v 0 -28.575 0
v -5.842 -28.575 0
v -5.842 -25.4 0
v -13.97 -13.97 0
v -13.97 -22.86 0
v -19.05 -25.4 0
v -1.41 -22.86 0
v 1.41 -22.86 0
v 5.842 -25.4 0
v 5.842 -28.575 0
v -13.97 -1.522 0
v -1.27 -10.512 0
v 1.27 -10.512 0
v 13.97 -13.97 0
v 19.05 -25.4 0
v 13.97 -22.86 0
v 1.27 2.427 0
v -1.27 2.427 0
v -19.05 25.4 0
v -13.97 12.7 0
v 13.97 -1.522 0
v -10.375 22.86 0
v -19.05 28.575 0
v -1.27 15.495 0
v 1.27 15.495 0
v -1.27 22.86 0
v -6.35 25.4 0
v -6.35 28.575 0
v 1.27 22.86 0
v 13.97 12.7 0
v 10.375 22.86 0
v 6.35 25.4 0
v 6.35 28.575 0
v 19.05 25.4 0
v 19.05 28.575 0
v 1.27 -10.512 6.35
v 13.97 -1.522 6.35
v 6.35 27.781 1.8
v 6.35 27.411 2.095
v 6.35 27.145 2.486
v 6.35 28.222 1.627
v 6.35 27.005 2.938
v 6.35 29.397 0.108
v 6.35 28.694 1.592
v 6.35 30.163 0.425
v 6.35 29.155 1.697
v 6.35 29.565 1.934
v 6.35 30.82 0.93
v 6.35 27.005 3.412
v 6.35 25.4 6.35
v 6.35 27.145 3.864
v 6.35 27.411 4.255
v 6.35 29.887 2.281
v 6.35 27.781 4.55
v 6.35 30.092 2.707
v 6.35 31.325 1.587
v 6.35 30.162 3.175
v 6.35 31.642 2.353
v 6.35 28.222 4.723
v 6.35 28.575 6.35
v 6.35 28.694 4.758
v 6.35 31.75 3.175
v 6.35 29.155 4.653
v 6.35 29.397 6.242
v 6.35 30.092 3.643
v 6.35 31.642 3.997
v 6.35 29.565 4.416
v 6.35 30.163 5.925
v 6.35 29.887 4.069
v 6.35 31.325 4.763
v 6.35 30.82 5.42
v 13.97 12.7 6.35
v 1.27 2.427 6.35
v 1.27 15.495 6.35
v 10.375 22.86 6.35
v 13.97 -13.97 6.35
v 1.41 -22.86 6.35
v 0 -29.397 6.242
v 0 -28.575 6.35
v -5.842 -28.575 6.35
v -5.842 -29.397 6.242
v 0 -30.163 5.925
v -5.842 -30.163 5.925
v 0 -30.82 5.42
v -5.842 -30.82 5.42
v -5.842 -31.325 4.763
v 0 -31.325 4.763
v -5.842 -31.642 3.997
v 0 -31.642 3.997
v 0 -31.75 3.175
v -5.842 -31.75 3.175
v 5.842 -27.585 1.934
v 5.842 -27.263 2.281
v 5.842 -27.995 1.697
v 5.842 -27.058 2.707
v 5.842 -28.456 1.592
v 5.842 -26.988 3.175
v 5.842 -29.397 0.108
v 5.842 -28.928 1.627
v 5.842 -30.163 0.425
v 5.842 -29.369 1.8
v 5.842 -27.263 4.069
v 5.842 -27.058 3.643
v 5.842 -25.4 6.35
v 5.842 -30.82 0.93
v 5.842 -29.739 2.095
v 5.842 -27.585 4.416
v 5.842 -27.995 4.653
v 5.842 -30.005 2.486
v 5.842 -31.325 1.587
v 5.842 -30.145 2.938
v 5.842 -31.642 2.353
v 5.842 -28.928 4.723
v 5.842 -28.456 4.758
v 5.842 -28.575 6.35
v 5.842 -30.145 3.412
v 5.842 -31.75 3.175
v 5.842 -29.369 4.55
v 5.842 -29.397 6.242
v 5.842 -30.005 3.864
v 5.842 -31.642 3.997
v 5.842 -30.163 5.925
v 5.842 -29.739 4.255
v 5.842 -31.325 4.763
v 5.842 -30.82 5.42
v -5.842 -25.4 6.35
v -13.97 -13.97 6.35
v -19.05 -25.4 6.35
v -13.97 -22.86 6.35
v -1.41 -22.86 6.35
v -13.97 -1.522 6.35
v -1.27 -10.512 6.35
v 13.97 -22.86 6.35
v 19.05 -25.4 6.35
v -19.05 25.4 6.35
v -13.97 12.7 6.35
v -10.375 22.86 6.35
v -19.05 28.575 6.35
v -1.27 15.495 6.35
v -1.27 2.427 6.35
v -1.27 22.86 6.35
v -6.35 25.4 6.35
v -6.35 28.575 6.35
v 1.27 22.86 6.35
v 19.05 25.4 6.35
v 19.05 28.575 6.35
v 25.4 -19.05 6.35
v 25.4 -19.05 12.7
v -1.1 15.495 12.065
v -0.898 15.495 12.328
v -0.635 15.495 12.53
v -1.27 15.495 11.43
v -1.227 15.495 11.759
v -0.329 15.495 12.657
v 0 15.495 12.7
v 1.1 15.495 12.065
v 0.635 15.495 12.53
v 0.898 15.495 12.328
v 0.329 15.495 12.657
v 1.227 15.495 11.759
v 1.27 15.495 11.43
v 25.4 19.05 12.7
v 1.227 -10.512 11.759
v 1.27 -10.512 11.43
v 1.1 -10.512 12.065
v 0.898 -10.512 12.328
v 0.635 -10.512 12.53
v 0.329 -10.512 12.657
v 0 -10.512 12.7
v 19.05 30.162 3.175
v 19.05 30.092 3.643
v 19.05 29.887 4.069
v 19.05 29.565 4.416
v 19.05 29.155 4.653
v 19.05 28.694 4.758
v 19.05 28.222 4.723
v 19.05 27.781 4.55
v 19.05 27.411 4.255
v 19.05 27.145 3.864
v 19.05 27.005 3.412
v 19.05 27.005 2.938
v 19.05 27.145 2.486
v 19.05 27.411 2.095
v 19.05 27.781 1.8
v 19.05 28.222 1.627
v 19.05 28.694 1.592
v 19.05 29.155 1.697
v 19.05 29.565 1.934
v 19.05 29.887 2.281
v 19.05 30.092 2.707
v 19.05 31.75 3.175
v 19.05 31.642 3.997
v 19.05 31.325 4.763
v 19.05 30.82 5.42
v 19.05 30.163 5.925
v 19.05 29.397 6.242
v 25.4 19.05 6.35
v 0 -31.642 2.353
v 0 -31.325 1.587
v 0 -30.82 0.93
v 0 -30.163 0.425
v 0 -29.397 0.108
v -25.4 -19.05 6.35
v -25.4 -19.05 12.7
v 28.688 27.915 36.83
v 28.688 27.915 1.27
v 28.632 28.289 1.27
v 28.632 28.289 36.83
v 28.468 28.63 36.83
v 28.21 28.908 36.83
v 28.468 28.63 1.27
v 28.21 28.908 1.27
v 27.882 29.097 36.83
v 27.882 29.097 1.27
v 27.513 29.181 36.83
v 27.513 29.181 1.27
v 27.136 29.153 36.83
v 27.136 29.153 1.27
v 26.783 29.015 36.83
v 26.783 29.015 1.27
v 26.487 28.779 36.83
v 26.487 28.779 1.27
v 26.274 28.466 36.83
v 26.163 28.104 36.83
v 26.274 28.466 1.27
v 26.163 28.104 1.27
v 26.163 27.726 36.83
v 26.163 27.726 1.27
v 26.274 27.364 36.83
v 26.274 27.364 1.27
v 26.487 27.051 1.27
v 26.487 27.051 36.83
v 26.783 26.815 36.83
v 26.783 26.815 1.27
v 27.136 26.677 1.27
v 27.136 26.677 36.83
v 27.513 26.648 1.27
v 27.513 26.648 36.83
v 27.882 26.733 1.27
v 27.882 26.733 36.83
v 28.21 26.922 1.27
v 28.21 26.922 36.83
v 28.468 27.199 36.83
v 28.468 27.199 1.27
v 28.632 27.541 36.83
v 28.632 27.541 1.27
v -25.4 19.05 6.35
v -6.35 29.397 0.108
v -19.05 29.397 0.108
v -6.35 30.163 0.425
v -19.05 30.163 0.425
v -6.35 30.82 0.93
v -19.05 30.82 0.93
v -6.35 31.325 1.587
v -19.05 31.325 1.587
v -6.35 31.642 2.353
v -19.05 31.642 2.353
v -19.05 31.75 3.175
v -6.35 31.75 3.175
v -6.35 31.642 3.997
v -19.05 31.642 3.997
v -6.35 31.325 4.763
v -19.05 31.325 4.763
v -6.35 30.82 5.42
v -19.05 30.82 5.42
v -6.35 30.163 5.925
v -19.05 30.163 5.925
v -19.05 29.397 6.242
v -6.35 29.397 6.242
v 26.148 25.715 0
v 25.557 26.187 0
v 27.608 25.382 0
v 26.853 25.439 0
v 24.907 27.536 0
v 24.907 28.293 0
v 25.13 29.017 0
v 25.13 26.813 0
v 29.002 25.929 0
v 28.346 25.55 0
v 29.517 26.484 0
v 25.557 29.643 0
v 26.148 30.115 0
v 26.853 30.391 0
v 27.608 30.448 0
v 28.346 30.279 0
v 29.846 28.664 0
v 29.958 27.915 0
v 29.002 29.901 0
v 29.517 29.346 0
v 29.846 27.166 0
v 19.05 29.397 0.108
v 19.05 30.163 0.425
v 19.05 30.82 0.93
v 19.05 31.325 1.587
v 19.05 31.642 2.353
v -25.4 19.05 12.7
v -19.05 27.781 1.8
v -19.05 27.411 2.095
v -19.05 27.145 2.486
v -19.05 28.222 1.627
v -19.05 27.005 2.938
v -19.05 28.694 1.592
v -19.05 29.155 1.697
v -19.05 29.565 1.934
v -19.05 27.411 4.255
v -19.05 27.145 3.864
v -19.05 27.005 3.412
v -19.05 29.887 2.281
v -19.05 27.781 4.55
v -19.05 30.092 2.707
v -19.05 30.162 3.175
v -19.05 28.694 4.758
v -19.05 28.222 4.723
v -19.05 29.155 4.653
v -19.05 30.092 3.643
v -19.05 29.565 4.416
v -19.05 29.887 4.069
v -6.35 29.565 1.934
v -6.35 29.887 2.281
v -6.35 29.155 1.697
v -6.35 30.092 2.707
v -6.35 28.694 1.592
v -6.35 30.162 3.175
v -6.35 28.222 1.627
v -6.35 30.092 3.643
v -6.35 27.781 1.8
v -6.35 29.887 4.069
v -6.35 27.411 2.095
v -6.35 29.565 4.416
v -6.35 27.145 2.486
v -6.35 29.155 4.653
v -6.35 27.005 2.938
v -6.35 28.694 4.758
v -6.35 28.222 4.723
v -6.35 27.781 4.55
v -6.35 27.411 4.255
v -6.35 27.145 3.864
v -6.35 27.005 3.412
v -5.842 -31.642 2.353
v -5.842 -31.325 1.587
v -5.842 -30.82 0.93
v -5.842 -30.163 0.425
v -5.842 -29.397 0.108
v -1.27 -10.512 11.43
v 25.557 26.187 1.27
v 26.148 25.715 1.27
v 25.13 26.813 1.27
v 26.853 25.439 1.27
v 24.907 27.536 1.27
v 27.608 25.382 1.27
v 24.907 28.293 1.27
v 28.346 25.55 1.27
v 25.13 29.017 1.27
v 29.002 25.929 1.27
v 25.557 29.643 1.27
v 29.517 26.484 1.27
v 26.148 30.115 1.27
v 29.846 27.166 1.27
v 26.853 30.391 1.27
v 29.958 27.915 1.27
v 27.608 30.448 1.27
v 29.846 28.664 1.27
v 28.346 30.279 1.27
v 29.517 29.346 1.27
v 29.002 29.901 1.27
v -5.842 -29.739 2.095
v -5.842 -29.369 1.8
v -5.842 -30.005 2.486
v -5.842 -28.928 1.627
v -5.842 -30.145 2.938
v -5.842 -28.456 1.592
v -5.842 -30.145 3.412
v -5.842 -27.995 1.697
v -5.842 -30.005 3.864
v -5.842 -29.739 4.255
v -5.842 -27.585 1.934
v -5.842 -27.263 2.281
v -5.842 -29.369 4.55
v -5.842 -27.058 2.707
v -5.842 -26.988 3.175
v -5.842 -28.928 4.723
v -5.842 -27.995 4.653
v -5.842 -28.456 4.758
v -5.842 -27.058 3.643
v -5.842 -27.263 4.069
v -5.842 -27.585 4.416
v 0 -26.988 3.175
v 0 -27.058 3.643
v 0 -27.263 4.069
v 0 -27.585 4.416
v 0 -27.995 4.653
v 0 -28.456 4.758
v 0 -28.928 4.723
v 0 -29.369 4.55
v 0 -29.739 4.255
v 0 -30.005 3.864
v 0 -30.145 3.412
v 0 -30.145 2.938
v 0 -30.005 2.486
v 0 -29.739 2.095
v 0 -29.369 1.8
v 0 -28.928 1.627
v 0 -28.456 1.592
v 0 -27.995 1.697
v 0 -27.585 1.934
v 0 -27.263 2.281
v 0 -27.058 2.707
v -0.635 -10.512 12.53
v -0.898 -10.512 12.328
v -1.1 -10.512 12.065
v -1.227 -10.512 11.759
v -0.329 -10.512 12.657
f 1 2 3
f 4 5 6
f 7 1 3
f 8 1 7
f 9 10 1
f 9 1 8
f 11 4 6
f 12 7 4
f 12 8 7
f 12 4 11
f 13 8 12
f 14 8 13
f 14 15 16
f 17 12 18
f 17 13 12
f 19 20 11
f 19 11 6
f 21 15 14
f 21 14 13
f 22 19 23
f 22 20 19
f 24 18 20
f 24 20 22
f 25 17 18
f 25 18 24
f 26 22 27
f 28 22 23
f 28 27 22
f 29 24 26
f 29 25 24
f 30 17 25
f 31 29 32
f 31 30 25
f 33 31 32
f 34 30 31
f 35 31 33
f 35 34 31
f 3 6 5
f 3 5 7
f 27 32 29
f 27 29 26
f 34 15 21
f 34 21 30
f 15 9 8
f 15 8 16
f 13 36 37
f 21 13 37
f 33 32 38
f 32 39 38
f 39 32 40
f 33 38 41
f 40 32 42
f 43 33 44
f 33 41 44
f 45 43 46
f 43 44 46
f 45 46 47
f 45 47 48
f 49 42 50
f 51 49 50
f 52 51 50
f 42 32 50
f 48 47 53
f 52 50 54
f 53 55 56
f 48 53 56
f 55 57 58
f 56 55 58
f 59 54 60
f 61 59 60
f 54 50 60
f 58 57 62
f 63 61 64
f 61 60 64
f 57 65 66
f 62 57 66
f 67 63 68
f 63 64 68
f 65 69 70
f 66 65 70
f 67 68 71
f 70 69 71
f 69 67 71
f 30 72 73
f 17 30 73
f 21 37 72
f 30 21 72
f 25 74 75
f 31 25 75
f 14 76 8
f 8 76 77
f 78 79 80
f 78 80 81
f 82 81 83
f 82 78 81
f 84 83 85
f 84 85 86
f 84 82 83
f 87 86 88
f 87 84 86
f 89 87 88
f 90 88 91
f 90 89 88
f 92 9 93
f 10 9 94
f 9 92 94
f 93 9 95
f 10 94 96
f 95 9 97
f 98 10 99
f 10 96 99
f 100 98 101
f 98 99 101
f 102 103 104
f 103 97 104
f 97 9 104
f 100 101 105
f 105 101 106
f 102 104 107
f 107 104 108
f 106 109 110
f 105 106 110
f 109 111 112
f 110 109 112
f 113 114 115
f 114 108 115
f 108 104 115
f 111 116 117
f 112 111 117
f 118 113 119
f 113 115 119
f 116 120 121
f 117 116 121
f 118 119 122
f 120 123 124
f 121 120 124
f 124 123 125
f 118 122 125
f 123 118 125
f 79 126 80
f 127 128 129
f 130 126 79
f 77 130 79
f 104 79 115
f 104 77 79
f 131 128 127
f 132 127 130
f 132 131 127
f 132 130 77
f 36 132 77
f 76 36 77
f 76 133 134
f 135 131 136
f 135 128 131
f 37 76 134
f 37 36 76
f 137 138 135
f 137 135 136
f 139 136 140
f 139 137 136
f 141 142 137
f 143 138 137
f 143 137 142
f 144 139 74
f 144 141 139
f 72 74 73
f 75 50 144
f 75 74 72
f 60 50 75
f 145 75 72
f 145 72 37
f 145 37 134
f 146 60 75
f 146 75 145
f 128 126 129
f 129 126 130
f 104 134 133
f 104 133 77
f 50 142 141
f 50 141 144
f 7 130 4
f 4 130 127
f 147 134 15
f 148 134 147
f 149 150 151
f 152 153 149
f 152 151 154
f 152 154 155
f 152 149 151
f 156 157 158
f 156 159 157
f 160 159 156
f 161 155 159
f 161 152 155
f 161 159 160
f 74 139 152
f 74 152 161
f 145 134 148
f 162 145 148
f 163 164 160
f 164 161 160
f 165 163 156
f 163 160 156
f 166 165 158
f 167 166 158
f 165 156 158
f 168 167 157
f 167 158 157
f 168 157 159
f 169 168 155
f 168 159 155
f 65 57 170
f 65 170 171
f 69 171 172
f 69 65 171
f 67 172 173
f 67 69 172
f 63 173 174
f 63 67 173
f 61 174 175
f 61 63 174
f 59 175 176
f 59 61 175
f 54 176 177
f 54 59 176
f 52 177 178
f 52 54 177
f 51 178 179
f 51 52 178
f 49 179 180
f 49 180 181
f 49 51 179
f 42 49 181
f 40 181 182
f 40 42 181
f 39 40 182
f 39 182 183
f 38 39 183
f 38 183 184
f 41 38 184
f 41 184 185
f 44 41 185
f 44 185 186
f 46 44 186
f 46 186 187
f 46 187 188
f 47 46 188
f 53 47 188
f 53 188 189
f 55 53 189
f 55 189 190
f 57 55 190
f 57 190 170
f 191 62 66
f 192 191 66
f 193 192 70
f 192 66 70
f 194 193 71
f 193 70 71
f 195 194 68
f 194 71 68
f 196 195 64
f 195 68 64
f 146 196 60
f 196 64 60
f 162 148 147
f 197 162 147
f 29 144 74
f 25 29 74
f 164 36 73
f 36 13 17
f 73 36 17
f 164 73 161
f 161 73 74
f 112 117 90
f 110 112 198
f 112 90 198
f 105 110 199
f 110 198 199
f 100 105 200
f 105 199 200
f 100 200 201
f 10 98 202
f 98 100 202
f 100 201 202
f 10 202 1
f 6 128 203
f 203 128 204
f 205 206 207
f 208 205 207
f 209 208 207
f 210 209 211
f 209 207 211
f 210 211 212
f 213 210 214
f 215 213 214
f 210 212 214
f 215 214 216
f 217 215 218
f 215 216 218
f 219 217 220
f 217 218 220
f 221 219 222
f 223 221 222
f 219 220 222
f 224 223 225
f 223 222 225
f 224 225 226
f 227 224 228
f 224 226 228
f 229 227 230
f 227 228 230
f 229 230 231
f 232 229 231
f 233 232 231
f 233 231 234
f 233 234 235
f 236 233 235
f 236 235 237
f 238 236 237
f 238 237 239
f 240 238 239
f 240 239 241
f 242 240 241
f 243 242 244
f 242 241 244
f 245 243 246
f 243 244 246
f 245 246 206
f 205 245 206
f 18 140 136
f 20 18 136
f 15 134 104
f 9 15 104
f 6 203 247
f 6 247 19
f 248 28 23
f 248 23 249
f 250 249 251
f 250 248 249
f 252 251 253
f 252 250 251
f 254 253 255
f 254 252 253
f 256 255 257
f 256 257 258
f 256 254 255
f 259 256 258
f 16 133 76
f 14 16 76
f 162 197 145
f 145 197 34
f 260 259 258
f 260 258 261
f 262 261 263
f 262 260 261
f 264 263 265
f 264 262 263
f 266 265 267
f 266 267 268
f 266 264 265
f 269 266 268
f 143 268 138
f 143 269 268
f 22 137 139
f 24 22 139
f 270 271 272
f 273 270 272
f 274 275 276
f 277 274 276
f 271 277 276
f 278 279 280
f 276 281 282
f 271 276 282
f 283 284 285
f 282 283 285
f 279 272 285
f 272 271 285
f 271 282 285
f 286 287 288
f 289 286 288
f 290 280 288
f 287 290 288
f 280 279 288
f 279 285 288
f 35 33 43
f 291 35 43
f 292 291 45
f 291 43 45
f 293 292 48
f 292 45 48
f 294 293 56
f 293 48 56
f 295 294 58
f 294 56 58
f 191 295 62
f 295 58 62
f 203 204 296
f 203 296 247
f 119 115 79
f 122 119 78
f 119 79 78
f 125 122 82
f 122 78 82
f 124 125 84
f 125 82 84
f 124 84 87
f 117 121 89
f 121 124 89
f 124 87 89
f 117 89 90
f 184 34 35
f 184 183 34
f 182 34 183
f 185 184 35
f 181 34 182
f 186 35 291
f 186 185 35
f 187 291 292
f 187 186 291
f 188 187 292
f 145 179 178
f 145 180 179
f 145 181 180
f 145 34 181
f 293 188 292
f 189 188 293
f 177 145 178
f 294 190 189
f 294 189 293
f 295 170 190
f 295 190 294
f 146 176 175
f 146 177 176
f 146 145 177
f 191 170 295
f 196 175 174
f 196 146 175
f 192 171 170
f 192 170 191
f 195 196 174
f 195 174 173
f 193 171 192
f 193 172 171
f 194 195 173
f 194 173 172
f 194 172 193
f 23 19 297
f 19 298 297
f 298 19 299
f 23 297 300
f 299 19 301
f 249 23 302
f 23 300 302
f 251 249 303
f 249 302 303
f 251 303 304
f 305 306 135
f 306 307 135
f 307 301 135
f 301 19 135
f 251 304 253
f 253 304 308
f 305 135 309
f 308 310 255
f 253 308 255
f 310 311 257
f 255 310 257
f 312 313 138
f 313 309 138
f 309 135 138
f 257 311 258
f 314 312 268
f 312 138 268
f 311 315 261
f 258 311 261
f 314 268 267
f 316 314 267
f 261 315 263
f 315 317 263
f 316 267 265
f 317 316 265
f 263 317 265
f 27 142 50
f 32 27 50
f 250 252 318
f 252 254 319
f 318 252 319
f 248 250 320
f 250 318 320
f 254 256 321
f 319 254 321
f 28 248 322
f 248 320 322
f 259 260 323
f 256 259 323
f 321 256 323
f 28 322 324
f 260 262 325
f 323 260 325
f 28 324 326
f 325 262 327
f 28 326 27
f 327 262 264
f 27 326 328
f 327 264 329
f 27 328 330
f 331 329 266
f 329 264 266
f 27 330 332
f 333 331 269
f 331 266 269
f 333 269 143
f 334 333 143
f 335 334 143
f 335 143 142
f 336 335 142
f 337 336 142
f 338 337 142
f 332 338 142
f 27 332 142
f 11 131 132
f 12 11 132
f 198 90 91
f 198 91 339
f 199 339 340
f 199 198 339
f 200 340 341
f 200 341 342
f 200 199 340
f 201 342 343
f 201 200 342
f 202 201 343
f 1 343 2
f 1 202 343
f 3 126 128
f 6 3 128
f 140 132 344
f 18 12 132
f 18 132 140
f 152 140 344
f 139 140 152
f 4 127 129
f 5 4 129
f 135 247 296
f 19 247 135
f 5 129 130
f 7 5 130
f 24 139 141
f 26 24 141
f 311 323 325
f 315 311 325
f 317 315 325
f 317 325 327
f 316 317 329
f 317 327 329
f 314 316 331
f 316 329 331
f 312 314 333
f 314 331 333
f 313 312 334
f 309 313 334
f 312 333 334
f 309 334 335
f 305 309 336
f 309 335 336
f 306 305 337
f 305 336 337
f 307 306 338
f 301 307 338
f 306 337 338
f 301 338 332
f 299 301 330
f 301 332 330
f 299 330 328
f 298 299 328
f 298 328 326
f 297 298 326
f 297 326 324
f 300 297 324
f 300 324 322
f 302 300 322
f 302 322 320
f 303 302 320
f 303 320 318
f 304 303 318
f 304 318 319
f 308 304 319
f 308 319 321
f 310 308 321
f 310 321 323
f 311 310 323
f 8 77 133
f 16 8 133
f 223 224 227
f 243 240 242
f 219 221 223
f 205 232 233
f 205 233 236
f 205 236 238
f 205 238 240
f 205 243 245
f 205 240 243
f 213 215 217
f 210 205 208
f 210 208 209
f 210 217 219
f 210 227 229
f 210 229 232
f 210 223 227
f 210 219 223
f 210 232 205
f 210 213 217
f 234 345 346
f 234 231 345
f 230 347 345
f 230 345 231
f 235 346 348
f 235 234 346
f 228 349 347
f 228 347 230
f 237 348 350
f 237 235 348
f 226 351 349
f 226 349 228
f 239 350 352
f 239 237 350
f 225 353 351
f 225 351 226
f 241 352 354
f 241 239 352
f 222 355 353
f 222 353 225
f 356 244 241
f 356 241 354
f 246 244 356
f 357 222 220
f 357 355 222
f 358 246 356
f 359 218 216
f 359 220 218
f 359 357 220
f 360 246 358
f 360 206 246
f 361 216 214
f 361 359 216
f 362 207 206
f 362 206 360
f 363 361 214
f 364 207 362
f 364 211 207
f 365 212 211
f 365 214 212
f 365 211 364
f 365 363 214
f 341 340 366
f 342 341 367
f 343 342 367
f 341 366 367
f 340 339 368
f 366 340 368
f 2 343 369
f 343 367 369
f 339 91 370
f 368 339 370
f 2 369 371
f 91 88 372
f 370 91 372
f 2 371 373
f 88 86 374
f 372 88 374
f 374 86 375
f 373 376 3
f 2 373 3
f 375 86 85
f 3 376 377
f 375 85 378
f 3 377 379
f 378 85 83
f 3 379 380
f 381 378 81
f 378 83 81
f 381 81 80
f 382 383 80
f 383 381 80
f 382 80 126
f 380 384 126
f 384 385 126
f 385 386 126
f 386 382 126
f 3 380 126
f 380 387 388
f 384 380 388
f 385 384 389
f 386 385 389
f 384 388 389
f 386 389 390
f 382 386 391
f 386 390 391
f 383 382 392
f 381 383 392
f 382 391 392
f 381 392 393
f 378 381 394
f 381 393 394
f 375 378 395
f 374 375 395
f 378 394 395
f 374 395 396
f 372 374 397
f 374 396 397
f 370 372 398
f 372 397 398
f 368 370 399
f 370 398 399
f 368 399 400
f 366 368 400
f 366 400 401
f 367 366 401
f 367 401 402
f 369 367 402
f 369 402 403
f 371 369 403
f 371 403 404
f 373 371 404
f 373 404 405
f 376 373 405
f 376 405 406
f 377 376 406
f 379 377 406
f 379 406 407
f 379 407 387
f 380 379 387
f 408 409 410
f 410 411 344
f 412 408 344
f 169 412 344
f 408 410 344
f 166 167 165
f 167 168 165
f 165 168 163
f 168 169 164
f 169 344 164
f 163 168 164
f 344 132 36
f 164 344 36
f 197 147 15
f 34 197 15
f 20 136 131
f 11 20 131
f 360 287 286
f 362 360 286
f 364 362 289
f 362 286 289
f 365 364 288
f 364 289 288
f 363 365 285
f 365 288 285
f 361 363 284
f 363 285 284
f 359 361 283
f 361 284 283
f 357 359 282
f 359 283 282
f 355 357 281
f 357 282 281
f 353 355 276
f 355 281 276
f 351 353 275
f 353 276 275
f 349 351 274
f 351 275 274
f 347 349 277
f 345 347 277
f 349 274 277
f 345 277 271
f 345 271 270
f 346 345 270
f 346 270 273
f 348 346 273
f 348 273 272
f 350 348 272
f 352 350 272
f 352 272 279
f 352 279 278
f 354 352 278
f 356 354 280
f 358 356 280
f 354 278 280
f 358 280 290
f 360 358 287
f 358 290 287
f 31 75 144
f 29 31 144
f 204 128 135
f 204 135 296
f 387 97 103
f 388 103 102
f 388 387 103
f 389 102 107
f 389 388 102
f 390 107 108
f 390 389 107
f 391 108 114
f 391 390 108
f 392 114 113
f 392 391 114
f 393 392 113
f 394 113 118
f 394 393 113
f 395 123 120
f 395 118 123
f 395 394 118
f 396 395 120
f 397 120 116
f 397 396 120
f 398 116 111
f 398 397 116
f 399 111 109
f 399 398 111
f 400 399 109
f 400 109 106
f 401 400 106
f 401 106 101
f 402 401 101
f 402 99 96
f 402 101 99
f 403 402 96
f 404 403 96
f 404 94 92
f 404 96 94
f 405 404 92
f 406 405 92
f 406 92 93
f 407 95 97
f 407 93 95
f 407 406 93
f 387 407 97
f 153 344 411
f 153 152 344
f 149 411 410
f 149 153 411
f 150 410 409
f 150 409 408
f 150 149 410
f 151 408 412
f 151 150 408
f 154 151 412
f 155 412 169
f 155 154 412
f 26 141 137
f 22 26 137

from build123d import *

# Parameters (mm, degrees)
F0_W      = 38.1
F0_H      = 50.8
F1_DEPTH  = 6.35
F3_DEPTH  = 50.8
F4_W      = 25.4
F4_H      = 6.35
F4_R      = 1.5875
F5_DEPTH  = 19.05
F6_W      = 12.7
F6_H      = 3.175
F6_W_2    = 0.508
F7_DEPTH  = 25.4
F9_DEPTH  = 12.7
F13_DEPTH = 6.351
F14_W     = 2.54
F14_H     = 26.006285722
F15_DEPTH = 6.35
F16_R     = 1.26999
F17_R     = 2.54
F18_DEPTH = 1.27
F19_R     = 1.27
F20_DEPTH = 35.56


# Not quite as in the source:
# - a fillet or chamfer is up to 0.001 mm smaller than in the source, because OpenCascade refuses the exact size


with BuildPart() as f1:
    # F0 (on Top) → F1 (new body)
    with BuildSketch(Plane.XY):
        Rectangle(F0_W, F0_H)
    extrude(amount=F1_DEPTH)

    # F2 (on face) → F3 (join, through all)
    with BuildSketch(Plane.XZ.offset(25.4)):
        Polygon((-19.05, 0), (-19.05, 6.35), (-25.4, 12.7), (-25.4, 6.35), align=None)
    extrude(amount=-F3_DEPTH)

    # F4 (on Right) → F5 (join, symmetric)
    with BuildSketch(Plane.YZ):
        with Locations((-12.7, 3.175)):
            Rectangle(F4_W, F4_H)
        with Locations((12.7, 3.175)):
            Rectangle(F4_W, F4_H)
        with BuildLine():
            Line((-28.575, 0), (-25.4, 0))
            Line((-25.4, 0), (-25.4, 6.35))
            Line((-25.4, 6.35), (-28.575, 6.35))
            ThreePointArc((-28.575, 6.35), (-30.8200640303, 5.4200640303), (-31.75, 3.175))
            ThreePointArc((-31.75, 3.175), (-30.8200640303, 0.9299359697), (-28.575, 0))
        make_face()
        with Locations((-28.575, 3.175)):
            Circle(F4_R, mode=Mode.SUBTRACT)
        with BuildLine():
            Line((25.4, 6.35), (25.4, 0))
            Line((25.4, 0), (28.575, 0))
            ThreePointArc((28.575, 0), (30.8200640303, 0.9299359697), (31.75, 3.175))
            ThreePointArc((31.75, 3.175), (30.8200640303, 5.4200640303), (28.575, 6.35))
            Line((28.575, 6.35), (25.4, 6.35))
        make_face()
        with Locations((28.575, 3.175)):
            Circle(F4_R, mode=Mode.SUBTRACT)
    extrude(amount=F5_DEPTH, both=True)

    # F6 (on face) → F7 (cut)
    with BuildSketch(Plane.XY.offset(6.35)):
        with Locations((0, 30.1625)):
            Rectangle(F6_W, F6_H)
        with Locations((0, 26.9875)):
            Rectangle(F6_W, F6_H)
        with Locations((12.7, -30.1625)):
            Rectangle(F6_W, F6_H)
        with Locations((12.7, -26.9875)):
            Rectangle(F6_W, F6_H)
        with Locations((6.096, -26.9875)):
            Rectangle(F6_W_2, F6_H)
        with Locations((6.096, -30.1625)):
            Rectangle(F6_W_2, F6_H)
        with Locations((-12.7, -30.1625)):
            Rectangle(F6_W, F6_H)
        with Locations((-12.7, -26.9875)):
            Rectangle(F6_W, F6_H)
        with Locations((-6.096, -26.9875)):
            Rectangle(F6_W_2, F6_H)
        with Locations((-6.096, -30.1625)):
            Rectangle(F6_W_2, F6_H)
    extrude(amount=-F7_DEPTH, mode=Mode.SUBTRACT)

    # F8 (on face) → F9 (cut, symmetric)
    with BuildSketch(Plane.XY.offset(6.35)):
        Polygon((-35.3634544947, 9.0865455053), (-19.05, 25.4), (-35.675508843, 25.4), align=None)
        Polygon((-34.7037734637, -25.4), (-19.05, -25.4), (-35.0090485041, -9.4409514959), align=None)
    extrude(amount=F9_DEPTH, both=True, mode=Mode.SUBTRACT)

    # F11: F1 across plane


with BuildPart() as f1_1:
    add(f1.part)
    add(f1.part.mirror(Plane(origin=(0, 2.2576834917, 3.175), x_dir=(0, 1, 0), z_dir=(1, 0, 0))))

    # F12 (on face) → F13 (cut, through all)
    with BuildSketch(Plane.XY.offset(6.35)):
        Polygon((-1.27, 22.86), (-10.3751054608, 22.86), (-1.27, 15.4946079875), align=None)
        Polygon((10.3751054608, 22.86), (1.27, 22.86), (1.27, 15.4946079875), align=None)
        Polygon((-1.27, 0), (-13.97, 0), (-13.97, -1.5224442665), (-1.27, -10.5116777345), align=None)
        Polygon((13.97, 0), (1.27, 0), (1.27, -10.5116777345), (13.97, -1.5224442665), align=None)
        Polygon((13.97, -13.97), (1.4101971646, -22.86), (13.97, -22.86), align=None)
        Polygon((-1.4101971646, -22.86), (-13.97, -13.97), (-13.97, -22.86), align=None)
        Polygon((-1.27, 2.4265903223), (-13.97, 12.7), (-13.97, 0), (-1.27, 0), align=None)
        Polygon((1.27, 2.4265903223), (1.27, 0), (13.97, 0), (13.97, 12.7), align=None)
    extrude(amount=-F13_DEPTH, mode=Mode.SUBTRACT)

    # F14 (on face) → F15 (join)
    with BuildSketch(Plane.XY.offset(6.35)):
        with Locations((0, 2.4914651265)):
            Rectangle(F14_W, F14_H)
    extrude(amount=F15_DEPTH)

    # F16 (radius 1.27 in the source; OpenCascade refuses exactly that, so slightly less here)
    f16_edges = [f1_1.edges().sort_by_distance(p)[0] for p in [
        (-1.27, 2.491465, 12.7),
        (1.27, 2.491465, 12.7),
    ]]
    fillet(f16_edges, radius=F16_R)


with BuildPart() as f18:
    # F17 (on face) → F18 (new body)
    with BuildSketch(Plane.XY):
        with Locations((27.4184718728, 27.9149059206)):
            Circle(F17_R)
    extrude(amount=F18_DEPTH)

    # F19 (on face) → F20 (join)
    with BuildSketch(Plane.XY.offset(1.27)):
        with Locations((27.4184718728, 27.9149059206)):
            Circle(F19_R)
    extrude(amount=F20_DEPTH)


solid = Compound([f1_1.part, f18.part])
